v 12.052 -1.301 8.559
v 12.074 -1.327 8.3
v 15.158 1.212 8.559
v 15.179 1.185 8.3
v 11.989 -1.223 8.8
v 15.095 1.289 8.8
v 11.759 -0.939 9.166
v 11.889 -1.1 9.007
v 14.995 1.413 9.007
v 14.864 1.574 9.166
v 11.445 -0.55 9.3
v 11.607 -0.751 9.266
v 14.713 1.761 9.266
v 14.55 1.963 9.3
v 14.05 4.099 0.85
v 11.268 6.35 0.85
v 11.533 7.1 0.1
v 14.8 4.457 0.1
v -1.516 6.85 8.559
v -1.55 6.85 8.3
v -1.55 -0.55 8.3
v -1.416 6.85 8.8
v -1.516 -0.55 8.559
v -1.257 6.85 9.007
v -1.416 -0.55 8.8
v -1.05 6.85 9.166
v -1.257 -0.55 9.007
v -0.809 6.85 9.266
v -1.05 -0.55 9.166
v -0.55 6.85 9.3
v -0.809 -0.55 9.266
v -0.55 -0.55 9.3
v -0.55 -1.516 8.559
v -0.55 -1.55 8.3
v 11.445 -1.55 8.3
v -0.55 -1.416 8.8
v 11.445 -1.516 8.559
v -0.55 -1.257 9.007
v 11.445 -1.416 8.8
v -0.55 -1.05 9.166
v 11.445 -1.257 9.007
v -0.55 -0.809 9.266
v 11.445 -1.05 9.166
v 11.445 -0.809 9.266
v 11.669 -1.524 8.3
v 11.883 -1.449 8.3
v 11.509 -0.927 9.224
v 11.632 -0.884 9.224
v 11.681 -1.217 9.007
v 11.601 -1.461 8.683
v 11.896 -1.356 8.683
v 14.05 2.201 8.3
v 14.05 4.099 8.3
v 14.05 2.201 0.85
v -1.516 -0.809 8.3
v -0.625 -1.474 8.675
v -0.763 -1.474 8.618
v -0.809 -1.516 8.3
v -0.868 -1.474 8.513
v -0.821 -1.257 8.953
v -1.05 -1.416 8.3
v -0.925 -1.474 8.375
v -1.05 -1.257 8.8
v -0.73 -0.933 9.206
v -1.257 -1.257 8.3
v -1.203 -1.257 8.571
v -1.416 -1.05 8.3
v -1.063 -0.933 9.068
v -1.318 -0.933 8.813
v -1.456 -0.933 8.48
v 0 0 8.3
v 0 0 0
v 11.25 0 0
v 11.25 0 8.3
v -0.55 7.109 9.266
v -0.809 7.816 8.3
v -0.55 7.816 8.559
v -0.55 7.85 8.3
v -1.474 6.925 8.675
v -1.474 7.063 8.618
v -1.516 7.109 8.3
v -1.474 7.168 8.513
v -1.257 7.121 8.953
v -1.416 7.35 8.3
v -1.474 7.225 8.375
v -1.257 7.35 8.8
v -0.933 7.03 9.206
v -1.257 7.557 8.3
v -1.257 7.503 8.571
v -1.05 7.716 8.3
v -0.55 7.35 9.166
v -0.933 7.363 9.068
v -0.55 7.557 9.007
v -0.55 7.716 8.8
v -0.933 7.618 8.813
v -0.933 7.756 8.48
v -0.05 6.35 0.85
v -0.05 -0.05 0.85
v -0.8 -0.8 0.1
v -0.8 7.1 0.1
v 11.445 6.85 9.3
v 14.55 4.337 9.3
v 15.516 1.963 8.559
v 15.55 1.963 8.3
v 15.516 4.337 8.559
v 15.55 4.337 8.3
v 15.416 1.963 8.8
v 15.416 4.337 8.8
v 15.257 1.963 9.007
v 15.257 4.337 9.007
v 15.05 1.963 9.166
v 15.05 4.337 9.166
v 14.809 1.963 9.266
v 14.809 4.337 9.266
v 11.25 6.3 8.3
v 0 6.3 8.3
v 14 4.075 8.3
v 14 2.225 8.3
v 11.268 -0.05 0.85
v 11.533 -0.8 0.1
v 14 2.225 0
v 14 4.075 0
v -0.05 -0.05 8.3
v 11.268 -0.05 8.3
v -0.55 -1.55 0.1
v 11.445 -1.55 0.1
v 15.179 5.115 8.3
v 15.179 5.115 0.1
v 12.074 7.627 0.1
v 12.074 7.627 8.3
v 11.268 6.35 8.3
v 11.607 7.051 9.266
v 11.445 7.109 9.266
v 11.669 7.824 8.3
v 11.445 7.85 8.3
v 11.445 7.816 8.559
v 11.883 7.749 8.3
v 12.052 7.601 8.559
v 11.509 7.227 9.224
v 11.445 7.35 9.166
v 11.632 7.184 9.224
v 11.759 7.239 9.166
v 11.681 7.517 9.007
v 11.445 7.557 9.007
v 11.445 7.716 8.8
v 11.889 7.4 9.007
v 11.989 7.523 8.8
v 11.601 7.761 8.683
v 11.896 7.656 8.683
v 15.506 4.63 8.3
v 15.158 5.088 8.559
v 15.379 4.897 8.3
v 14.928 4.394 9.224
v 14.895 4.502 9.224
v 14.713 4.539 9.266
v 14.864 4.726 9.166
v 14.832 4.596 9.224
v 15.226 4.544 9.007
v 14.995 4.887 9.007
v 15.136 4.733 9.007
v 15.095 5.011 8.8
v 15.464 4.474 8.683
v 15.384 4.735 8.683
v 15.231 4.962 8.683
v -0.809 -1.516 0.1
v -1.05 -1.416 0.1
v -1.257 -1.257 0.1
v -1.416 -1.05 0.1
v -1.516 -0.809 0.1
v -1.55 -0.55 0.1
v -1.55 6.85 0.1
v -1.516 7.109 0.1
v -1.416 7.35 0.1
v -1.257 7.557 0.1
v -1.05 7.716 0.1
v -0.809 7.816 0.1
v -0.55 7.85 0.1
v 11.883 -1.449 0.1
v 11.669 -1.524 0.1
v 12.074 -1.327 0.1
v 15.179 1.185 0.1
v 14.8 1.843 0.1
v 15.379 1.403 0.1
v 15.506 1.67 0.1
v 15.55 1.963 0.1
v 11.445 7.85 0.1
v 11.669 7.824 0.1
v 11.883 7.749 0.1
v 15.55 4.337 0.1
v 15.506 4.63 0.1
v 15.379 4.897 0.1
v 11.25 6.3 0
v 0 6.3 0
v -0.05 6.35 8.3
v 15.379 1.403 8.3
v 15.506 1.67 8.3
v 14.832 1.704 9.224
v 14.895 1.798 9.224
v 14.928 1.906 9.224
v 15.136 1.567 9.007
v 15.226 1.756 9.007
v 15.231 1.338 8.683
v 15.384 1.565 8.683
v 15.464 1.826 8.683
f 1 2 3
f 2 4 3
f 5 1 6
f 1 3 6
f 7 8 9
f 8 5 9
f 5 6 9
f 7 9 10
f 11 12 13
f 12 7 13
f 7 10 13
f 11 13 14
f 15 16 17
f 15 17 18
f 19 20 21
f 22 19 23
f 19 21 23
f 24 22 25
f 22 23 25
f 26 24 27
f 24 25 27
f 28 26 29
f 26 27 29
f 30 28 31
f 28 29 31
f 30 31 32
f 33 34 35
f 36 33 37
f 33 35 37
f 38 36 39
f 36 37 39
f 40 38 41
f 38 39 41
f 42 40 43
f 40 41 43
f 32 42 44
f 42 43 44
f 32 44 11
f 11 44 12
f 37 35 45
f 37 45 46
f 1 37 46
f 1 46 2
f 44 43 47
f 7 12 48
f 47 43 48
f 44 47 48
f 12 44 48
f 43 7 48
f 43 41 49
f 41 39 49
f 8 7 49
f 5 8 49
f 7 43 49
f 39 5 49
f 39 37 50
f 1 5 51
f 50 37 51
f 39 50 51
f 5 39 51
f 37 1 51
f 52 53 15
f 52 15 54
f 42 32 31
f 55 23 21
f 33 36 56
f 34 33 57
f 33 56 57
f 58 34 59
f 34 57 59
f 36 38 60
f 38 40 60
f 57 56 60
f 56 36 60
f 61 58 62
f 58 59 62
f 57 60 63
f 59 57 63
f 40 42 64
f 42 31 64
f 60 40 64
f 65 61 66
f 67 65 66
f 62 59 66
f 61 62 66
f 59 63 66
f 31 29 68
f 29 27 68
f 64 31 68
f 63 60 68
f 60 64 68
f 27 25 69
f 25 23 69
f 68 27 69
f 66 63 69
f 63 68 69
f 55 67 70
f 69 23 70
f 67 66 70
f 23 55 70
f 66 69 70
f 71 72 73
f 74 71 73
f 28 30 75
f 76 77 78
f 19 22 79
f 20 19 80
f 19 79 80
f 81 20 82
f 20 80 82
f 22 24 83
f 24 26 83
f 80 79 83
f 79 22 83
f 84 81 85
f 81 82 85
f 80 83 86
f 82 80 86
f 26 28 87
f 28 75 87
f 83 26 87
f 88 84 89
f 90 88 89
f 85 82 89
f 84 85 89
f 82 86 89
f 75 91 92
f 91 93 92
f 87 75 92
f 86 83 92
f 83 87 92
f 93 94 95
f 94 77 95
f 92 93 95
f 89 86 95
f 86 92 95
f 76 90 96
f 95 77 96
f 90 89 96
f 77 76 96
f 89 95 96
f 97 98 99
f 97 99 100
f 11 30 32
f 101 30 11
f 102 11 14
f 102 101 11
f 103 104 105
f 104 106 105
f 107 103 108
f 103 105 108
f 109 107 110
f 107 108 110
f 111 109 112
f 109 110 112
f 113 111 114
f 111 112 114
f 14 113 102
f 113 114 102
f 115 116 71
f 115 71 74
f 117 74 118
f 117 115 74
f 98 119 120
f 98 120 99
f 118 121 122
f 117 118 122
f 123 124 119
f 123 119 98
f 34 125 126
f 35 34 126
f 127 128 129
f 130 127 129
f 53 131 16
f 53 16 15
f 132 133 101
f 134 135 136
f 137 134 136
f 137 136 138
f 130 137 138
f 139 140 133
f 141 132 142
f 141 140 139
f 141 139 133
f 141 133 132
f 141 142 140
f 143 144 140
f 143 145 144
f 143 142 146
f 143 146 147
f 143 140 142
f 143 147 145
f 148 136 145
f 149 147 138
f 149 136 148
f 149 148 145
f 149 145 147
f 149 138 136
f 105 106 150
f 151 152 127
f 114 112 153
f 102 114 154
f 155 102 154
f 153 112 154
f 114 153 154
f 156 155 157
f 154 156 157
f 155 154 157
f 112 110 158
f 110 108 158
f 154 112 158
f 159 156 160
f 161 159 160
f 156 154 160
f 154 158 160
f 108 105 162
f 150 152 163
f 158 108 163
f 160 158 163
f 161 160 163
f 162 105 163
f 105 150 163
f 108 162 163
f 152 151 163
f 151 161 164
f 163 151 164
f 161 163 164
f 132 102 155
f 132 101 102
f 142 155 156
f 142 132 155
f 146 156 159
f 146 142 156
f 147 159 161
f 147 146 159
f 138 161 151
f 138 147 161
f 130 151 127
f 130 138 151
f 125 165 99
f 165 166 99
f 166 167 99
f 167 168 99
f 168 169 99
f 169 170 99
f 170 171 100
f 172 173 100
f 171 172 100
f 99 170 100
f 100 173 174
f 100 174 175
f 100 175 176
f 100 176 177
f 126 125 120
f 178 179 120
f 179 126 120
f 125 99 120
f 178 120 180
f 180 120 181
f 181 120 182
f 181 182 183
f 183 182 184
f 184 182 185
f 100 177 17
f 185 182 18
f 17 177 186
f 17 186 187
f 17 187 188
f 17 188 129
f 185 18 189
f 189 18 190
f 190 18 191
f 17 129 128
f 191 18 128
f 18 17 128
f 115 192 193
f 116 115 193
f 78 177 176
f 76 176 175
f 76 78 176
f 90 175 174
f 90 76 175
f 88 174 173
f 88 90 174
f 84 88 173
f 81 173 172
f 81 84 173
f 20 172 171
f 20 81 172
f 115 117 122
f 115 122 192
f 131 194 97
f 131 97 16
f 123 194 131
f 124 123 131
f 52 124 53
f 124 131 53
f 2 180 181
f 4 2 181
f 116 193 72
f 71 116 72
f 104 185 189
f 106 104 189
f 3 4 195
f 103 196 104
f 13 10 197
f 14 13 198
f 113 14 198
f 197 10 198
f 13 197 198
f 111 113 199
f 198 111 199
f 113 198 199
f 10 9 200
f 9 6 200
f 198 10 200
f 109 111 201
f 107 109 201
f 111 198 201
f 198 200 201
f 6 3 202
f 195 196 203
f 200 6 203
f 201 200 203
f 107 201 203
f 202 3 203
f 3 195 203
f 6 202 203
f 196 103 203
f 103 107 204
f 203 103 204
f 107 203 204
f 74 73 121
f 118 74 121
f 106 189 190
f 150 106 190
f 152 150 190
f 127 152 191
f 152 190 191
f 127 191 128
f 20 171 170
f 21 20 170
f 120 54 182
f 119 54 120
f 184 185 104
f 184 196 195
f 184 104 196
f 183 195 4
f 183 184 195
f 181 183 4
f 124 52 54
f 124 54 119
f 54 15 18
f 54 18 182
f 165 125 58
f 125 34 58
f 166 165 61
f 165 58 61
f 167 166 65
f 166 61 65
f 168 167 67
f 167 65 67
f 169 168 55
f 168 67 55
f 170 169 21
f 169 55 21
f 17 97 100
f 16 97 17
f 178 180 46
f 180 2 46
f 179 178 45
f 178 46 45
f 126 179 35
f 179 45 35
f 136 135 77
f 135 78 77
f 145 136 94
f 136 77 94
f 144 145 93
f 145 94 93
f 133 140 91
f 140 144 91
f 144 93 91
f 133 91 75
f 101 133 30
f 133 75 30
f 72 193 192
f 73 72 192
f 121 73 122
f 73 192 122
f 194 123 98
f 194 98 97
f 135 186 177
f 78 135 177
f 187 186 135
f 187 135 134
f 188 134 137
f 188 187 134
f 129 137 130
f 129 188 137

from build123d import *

# Parameters (mm, degrees)
F1_DEPTH = 8.3
F3_DEPTH = 8.2
F5_DEPTH = 1
F6_R     = 1
F7_SIZE  = 0.75


with BuildPart() as f1:
    # F0 (on Top) → F1 (new body)
    with BuildSketch(Plane.XY):
        Polygon((0, 6.3), (0, 0), (11.25, 0), (14, 2.225), (14, 4.075), (11.25, 6.3), align=None)
    extrude(amount=F1_DEPTH)


with BuildPart() as f3:
    # F2 (on face) → F3 (new body)
    with BuildSketch(Plane.XY.offset(8.3)):
        Polygon((-1.55, 7.85), (-1.55, -1.55), (11.7985185798, -1.55), (15.55, 1.4852895127), (15.55, 4.8147104873), (11.7985185798, 7.85), align=None)
        Polygon((11.2676941477, -0.05), (-0.05, -0.05), (-0.05, 6.35), (11.2676941477, 6.35), (14.05, 4.0988616286), (14.05, 2.2011383714), align=None, mode=Mode.SUBTRACT)
    extrude(amount=-F3_DEPTH)

    # F4 (on face) → F5 (join)
    with BuildSketch(Plane.XY.offset(8.3)):
        Polygon((11.7985185798, 7.85), (-1.55, 7.85), (-1.55, -1.55), (11.7985185798, -1.55), (15.55, 1.4852895127), (15.55, 4.8147104873), align=None)
    extrude(amount=F5_DEPTH)

    # F6
    f6_edges = [f3.edges().sort_by_distance(p)[0] for p in [
        (5.124259, 7.85, 9.3),
        (-1.55, 3.15, 9.3),
        (5.124259, -1.55, 9.3),
        (13.674259, -0.032355, 9.3),
        (15.55, 3.15, 9.3),
        (13.674259, 6.332355, 9.3),
        (-1.55, -1.55, 4.7),
        (-1.55, 7.85, 4.7),
        (11.798519, 7.85, 4.7),
        (15.55, 4.81471, 4.7),
        (15.55, 1.48529, 4.7),
        (11.798519, -1.55, 4.7),
    ]]
    fillet(f6_edges, radius=F6_R)

    # F7
    f7_edges = [f3.edges().sort_by_distance(p)[0] for p in [
        (12.658847, 1.075569, 0.1),
        (14.05, 3.15, 0.1),
        (12.658847, 5.224431, 0.1),
        (5.608847, 6.35, 0.1),
        (-0.05, 3.15, 0.1),
        (5.608847, -0.05, 0.1),
    ]]
    chamfer(f7_edges, length=F7_SIZE)


solid = Compound([f1.part, f3.part])
